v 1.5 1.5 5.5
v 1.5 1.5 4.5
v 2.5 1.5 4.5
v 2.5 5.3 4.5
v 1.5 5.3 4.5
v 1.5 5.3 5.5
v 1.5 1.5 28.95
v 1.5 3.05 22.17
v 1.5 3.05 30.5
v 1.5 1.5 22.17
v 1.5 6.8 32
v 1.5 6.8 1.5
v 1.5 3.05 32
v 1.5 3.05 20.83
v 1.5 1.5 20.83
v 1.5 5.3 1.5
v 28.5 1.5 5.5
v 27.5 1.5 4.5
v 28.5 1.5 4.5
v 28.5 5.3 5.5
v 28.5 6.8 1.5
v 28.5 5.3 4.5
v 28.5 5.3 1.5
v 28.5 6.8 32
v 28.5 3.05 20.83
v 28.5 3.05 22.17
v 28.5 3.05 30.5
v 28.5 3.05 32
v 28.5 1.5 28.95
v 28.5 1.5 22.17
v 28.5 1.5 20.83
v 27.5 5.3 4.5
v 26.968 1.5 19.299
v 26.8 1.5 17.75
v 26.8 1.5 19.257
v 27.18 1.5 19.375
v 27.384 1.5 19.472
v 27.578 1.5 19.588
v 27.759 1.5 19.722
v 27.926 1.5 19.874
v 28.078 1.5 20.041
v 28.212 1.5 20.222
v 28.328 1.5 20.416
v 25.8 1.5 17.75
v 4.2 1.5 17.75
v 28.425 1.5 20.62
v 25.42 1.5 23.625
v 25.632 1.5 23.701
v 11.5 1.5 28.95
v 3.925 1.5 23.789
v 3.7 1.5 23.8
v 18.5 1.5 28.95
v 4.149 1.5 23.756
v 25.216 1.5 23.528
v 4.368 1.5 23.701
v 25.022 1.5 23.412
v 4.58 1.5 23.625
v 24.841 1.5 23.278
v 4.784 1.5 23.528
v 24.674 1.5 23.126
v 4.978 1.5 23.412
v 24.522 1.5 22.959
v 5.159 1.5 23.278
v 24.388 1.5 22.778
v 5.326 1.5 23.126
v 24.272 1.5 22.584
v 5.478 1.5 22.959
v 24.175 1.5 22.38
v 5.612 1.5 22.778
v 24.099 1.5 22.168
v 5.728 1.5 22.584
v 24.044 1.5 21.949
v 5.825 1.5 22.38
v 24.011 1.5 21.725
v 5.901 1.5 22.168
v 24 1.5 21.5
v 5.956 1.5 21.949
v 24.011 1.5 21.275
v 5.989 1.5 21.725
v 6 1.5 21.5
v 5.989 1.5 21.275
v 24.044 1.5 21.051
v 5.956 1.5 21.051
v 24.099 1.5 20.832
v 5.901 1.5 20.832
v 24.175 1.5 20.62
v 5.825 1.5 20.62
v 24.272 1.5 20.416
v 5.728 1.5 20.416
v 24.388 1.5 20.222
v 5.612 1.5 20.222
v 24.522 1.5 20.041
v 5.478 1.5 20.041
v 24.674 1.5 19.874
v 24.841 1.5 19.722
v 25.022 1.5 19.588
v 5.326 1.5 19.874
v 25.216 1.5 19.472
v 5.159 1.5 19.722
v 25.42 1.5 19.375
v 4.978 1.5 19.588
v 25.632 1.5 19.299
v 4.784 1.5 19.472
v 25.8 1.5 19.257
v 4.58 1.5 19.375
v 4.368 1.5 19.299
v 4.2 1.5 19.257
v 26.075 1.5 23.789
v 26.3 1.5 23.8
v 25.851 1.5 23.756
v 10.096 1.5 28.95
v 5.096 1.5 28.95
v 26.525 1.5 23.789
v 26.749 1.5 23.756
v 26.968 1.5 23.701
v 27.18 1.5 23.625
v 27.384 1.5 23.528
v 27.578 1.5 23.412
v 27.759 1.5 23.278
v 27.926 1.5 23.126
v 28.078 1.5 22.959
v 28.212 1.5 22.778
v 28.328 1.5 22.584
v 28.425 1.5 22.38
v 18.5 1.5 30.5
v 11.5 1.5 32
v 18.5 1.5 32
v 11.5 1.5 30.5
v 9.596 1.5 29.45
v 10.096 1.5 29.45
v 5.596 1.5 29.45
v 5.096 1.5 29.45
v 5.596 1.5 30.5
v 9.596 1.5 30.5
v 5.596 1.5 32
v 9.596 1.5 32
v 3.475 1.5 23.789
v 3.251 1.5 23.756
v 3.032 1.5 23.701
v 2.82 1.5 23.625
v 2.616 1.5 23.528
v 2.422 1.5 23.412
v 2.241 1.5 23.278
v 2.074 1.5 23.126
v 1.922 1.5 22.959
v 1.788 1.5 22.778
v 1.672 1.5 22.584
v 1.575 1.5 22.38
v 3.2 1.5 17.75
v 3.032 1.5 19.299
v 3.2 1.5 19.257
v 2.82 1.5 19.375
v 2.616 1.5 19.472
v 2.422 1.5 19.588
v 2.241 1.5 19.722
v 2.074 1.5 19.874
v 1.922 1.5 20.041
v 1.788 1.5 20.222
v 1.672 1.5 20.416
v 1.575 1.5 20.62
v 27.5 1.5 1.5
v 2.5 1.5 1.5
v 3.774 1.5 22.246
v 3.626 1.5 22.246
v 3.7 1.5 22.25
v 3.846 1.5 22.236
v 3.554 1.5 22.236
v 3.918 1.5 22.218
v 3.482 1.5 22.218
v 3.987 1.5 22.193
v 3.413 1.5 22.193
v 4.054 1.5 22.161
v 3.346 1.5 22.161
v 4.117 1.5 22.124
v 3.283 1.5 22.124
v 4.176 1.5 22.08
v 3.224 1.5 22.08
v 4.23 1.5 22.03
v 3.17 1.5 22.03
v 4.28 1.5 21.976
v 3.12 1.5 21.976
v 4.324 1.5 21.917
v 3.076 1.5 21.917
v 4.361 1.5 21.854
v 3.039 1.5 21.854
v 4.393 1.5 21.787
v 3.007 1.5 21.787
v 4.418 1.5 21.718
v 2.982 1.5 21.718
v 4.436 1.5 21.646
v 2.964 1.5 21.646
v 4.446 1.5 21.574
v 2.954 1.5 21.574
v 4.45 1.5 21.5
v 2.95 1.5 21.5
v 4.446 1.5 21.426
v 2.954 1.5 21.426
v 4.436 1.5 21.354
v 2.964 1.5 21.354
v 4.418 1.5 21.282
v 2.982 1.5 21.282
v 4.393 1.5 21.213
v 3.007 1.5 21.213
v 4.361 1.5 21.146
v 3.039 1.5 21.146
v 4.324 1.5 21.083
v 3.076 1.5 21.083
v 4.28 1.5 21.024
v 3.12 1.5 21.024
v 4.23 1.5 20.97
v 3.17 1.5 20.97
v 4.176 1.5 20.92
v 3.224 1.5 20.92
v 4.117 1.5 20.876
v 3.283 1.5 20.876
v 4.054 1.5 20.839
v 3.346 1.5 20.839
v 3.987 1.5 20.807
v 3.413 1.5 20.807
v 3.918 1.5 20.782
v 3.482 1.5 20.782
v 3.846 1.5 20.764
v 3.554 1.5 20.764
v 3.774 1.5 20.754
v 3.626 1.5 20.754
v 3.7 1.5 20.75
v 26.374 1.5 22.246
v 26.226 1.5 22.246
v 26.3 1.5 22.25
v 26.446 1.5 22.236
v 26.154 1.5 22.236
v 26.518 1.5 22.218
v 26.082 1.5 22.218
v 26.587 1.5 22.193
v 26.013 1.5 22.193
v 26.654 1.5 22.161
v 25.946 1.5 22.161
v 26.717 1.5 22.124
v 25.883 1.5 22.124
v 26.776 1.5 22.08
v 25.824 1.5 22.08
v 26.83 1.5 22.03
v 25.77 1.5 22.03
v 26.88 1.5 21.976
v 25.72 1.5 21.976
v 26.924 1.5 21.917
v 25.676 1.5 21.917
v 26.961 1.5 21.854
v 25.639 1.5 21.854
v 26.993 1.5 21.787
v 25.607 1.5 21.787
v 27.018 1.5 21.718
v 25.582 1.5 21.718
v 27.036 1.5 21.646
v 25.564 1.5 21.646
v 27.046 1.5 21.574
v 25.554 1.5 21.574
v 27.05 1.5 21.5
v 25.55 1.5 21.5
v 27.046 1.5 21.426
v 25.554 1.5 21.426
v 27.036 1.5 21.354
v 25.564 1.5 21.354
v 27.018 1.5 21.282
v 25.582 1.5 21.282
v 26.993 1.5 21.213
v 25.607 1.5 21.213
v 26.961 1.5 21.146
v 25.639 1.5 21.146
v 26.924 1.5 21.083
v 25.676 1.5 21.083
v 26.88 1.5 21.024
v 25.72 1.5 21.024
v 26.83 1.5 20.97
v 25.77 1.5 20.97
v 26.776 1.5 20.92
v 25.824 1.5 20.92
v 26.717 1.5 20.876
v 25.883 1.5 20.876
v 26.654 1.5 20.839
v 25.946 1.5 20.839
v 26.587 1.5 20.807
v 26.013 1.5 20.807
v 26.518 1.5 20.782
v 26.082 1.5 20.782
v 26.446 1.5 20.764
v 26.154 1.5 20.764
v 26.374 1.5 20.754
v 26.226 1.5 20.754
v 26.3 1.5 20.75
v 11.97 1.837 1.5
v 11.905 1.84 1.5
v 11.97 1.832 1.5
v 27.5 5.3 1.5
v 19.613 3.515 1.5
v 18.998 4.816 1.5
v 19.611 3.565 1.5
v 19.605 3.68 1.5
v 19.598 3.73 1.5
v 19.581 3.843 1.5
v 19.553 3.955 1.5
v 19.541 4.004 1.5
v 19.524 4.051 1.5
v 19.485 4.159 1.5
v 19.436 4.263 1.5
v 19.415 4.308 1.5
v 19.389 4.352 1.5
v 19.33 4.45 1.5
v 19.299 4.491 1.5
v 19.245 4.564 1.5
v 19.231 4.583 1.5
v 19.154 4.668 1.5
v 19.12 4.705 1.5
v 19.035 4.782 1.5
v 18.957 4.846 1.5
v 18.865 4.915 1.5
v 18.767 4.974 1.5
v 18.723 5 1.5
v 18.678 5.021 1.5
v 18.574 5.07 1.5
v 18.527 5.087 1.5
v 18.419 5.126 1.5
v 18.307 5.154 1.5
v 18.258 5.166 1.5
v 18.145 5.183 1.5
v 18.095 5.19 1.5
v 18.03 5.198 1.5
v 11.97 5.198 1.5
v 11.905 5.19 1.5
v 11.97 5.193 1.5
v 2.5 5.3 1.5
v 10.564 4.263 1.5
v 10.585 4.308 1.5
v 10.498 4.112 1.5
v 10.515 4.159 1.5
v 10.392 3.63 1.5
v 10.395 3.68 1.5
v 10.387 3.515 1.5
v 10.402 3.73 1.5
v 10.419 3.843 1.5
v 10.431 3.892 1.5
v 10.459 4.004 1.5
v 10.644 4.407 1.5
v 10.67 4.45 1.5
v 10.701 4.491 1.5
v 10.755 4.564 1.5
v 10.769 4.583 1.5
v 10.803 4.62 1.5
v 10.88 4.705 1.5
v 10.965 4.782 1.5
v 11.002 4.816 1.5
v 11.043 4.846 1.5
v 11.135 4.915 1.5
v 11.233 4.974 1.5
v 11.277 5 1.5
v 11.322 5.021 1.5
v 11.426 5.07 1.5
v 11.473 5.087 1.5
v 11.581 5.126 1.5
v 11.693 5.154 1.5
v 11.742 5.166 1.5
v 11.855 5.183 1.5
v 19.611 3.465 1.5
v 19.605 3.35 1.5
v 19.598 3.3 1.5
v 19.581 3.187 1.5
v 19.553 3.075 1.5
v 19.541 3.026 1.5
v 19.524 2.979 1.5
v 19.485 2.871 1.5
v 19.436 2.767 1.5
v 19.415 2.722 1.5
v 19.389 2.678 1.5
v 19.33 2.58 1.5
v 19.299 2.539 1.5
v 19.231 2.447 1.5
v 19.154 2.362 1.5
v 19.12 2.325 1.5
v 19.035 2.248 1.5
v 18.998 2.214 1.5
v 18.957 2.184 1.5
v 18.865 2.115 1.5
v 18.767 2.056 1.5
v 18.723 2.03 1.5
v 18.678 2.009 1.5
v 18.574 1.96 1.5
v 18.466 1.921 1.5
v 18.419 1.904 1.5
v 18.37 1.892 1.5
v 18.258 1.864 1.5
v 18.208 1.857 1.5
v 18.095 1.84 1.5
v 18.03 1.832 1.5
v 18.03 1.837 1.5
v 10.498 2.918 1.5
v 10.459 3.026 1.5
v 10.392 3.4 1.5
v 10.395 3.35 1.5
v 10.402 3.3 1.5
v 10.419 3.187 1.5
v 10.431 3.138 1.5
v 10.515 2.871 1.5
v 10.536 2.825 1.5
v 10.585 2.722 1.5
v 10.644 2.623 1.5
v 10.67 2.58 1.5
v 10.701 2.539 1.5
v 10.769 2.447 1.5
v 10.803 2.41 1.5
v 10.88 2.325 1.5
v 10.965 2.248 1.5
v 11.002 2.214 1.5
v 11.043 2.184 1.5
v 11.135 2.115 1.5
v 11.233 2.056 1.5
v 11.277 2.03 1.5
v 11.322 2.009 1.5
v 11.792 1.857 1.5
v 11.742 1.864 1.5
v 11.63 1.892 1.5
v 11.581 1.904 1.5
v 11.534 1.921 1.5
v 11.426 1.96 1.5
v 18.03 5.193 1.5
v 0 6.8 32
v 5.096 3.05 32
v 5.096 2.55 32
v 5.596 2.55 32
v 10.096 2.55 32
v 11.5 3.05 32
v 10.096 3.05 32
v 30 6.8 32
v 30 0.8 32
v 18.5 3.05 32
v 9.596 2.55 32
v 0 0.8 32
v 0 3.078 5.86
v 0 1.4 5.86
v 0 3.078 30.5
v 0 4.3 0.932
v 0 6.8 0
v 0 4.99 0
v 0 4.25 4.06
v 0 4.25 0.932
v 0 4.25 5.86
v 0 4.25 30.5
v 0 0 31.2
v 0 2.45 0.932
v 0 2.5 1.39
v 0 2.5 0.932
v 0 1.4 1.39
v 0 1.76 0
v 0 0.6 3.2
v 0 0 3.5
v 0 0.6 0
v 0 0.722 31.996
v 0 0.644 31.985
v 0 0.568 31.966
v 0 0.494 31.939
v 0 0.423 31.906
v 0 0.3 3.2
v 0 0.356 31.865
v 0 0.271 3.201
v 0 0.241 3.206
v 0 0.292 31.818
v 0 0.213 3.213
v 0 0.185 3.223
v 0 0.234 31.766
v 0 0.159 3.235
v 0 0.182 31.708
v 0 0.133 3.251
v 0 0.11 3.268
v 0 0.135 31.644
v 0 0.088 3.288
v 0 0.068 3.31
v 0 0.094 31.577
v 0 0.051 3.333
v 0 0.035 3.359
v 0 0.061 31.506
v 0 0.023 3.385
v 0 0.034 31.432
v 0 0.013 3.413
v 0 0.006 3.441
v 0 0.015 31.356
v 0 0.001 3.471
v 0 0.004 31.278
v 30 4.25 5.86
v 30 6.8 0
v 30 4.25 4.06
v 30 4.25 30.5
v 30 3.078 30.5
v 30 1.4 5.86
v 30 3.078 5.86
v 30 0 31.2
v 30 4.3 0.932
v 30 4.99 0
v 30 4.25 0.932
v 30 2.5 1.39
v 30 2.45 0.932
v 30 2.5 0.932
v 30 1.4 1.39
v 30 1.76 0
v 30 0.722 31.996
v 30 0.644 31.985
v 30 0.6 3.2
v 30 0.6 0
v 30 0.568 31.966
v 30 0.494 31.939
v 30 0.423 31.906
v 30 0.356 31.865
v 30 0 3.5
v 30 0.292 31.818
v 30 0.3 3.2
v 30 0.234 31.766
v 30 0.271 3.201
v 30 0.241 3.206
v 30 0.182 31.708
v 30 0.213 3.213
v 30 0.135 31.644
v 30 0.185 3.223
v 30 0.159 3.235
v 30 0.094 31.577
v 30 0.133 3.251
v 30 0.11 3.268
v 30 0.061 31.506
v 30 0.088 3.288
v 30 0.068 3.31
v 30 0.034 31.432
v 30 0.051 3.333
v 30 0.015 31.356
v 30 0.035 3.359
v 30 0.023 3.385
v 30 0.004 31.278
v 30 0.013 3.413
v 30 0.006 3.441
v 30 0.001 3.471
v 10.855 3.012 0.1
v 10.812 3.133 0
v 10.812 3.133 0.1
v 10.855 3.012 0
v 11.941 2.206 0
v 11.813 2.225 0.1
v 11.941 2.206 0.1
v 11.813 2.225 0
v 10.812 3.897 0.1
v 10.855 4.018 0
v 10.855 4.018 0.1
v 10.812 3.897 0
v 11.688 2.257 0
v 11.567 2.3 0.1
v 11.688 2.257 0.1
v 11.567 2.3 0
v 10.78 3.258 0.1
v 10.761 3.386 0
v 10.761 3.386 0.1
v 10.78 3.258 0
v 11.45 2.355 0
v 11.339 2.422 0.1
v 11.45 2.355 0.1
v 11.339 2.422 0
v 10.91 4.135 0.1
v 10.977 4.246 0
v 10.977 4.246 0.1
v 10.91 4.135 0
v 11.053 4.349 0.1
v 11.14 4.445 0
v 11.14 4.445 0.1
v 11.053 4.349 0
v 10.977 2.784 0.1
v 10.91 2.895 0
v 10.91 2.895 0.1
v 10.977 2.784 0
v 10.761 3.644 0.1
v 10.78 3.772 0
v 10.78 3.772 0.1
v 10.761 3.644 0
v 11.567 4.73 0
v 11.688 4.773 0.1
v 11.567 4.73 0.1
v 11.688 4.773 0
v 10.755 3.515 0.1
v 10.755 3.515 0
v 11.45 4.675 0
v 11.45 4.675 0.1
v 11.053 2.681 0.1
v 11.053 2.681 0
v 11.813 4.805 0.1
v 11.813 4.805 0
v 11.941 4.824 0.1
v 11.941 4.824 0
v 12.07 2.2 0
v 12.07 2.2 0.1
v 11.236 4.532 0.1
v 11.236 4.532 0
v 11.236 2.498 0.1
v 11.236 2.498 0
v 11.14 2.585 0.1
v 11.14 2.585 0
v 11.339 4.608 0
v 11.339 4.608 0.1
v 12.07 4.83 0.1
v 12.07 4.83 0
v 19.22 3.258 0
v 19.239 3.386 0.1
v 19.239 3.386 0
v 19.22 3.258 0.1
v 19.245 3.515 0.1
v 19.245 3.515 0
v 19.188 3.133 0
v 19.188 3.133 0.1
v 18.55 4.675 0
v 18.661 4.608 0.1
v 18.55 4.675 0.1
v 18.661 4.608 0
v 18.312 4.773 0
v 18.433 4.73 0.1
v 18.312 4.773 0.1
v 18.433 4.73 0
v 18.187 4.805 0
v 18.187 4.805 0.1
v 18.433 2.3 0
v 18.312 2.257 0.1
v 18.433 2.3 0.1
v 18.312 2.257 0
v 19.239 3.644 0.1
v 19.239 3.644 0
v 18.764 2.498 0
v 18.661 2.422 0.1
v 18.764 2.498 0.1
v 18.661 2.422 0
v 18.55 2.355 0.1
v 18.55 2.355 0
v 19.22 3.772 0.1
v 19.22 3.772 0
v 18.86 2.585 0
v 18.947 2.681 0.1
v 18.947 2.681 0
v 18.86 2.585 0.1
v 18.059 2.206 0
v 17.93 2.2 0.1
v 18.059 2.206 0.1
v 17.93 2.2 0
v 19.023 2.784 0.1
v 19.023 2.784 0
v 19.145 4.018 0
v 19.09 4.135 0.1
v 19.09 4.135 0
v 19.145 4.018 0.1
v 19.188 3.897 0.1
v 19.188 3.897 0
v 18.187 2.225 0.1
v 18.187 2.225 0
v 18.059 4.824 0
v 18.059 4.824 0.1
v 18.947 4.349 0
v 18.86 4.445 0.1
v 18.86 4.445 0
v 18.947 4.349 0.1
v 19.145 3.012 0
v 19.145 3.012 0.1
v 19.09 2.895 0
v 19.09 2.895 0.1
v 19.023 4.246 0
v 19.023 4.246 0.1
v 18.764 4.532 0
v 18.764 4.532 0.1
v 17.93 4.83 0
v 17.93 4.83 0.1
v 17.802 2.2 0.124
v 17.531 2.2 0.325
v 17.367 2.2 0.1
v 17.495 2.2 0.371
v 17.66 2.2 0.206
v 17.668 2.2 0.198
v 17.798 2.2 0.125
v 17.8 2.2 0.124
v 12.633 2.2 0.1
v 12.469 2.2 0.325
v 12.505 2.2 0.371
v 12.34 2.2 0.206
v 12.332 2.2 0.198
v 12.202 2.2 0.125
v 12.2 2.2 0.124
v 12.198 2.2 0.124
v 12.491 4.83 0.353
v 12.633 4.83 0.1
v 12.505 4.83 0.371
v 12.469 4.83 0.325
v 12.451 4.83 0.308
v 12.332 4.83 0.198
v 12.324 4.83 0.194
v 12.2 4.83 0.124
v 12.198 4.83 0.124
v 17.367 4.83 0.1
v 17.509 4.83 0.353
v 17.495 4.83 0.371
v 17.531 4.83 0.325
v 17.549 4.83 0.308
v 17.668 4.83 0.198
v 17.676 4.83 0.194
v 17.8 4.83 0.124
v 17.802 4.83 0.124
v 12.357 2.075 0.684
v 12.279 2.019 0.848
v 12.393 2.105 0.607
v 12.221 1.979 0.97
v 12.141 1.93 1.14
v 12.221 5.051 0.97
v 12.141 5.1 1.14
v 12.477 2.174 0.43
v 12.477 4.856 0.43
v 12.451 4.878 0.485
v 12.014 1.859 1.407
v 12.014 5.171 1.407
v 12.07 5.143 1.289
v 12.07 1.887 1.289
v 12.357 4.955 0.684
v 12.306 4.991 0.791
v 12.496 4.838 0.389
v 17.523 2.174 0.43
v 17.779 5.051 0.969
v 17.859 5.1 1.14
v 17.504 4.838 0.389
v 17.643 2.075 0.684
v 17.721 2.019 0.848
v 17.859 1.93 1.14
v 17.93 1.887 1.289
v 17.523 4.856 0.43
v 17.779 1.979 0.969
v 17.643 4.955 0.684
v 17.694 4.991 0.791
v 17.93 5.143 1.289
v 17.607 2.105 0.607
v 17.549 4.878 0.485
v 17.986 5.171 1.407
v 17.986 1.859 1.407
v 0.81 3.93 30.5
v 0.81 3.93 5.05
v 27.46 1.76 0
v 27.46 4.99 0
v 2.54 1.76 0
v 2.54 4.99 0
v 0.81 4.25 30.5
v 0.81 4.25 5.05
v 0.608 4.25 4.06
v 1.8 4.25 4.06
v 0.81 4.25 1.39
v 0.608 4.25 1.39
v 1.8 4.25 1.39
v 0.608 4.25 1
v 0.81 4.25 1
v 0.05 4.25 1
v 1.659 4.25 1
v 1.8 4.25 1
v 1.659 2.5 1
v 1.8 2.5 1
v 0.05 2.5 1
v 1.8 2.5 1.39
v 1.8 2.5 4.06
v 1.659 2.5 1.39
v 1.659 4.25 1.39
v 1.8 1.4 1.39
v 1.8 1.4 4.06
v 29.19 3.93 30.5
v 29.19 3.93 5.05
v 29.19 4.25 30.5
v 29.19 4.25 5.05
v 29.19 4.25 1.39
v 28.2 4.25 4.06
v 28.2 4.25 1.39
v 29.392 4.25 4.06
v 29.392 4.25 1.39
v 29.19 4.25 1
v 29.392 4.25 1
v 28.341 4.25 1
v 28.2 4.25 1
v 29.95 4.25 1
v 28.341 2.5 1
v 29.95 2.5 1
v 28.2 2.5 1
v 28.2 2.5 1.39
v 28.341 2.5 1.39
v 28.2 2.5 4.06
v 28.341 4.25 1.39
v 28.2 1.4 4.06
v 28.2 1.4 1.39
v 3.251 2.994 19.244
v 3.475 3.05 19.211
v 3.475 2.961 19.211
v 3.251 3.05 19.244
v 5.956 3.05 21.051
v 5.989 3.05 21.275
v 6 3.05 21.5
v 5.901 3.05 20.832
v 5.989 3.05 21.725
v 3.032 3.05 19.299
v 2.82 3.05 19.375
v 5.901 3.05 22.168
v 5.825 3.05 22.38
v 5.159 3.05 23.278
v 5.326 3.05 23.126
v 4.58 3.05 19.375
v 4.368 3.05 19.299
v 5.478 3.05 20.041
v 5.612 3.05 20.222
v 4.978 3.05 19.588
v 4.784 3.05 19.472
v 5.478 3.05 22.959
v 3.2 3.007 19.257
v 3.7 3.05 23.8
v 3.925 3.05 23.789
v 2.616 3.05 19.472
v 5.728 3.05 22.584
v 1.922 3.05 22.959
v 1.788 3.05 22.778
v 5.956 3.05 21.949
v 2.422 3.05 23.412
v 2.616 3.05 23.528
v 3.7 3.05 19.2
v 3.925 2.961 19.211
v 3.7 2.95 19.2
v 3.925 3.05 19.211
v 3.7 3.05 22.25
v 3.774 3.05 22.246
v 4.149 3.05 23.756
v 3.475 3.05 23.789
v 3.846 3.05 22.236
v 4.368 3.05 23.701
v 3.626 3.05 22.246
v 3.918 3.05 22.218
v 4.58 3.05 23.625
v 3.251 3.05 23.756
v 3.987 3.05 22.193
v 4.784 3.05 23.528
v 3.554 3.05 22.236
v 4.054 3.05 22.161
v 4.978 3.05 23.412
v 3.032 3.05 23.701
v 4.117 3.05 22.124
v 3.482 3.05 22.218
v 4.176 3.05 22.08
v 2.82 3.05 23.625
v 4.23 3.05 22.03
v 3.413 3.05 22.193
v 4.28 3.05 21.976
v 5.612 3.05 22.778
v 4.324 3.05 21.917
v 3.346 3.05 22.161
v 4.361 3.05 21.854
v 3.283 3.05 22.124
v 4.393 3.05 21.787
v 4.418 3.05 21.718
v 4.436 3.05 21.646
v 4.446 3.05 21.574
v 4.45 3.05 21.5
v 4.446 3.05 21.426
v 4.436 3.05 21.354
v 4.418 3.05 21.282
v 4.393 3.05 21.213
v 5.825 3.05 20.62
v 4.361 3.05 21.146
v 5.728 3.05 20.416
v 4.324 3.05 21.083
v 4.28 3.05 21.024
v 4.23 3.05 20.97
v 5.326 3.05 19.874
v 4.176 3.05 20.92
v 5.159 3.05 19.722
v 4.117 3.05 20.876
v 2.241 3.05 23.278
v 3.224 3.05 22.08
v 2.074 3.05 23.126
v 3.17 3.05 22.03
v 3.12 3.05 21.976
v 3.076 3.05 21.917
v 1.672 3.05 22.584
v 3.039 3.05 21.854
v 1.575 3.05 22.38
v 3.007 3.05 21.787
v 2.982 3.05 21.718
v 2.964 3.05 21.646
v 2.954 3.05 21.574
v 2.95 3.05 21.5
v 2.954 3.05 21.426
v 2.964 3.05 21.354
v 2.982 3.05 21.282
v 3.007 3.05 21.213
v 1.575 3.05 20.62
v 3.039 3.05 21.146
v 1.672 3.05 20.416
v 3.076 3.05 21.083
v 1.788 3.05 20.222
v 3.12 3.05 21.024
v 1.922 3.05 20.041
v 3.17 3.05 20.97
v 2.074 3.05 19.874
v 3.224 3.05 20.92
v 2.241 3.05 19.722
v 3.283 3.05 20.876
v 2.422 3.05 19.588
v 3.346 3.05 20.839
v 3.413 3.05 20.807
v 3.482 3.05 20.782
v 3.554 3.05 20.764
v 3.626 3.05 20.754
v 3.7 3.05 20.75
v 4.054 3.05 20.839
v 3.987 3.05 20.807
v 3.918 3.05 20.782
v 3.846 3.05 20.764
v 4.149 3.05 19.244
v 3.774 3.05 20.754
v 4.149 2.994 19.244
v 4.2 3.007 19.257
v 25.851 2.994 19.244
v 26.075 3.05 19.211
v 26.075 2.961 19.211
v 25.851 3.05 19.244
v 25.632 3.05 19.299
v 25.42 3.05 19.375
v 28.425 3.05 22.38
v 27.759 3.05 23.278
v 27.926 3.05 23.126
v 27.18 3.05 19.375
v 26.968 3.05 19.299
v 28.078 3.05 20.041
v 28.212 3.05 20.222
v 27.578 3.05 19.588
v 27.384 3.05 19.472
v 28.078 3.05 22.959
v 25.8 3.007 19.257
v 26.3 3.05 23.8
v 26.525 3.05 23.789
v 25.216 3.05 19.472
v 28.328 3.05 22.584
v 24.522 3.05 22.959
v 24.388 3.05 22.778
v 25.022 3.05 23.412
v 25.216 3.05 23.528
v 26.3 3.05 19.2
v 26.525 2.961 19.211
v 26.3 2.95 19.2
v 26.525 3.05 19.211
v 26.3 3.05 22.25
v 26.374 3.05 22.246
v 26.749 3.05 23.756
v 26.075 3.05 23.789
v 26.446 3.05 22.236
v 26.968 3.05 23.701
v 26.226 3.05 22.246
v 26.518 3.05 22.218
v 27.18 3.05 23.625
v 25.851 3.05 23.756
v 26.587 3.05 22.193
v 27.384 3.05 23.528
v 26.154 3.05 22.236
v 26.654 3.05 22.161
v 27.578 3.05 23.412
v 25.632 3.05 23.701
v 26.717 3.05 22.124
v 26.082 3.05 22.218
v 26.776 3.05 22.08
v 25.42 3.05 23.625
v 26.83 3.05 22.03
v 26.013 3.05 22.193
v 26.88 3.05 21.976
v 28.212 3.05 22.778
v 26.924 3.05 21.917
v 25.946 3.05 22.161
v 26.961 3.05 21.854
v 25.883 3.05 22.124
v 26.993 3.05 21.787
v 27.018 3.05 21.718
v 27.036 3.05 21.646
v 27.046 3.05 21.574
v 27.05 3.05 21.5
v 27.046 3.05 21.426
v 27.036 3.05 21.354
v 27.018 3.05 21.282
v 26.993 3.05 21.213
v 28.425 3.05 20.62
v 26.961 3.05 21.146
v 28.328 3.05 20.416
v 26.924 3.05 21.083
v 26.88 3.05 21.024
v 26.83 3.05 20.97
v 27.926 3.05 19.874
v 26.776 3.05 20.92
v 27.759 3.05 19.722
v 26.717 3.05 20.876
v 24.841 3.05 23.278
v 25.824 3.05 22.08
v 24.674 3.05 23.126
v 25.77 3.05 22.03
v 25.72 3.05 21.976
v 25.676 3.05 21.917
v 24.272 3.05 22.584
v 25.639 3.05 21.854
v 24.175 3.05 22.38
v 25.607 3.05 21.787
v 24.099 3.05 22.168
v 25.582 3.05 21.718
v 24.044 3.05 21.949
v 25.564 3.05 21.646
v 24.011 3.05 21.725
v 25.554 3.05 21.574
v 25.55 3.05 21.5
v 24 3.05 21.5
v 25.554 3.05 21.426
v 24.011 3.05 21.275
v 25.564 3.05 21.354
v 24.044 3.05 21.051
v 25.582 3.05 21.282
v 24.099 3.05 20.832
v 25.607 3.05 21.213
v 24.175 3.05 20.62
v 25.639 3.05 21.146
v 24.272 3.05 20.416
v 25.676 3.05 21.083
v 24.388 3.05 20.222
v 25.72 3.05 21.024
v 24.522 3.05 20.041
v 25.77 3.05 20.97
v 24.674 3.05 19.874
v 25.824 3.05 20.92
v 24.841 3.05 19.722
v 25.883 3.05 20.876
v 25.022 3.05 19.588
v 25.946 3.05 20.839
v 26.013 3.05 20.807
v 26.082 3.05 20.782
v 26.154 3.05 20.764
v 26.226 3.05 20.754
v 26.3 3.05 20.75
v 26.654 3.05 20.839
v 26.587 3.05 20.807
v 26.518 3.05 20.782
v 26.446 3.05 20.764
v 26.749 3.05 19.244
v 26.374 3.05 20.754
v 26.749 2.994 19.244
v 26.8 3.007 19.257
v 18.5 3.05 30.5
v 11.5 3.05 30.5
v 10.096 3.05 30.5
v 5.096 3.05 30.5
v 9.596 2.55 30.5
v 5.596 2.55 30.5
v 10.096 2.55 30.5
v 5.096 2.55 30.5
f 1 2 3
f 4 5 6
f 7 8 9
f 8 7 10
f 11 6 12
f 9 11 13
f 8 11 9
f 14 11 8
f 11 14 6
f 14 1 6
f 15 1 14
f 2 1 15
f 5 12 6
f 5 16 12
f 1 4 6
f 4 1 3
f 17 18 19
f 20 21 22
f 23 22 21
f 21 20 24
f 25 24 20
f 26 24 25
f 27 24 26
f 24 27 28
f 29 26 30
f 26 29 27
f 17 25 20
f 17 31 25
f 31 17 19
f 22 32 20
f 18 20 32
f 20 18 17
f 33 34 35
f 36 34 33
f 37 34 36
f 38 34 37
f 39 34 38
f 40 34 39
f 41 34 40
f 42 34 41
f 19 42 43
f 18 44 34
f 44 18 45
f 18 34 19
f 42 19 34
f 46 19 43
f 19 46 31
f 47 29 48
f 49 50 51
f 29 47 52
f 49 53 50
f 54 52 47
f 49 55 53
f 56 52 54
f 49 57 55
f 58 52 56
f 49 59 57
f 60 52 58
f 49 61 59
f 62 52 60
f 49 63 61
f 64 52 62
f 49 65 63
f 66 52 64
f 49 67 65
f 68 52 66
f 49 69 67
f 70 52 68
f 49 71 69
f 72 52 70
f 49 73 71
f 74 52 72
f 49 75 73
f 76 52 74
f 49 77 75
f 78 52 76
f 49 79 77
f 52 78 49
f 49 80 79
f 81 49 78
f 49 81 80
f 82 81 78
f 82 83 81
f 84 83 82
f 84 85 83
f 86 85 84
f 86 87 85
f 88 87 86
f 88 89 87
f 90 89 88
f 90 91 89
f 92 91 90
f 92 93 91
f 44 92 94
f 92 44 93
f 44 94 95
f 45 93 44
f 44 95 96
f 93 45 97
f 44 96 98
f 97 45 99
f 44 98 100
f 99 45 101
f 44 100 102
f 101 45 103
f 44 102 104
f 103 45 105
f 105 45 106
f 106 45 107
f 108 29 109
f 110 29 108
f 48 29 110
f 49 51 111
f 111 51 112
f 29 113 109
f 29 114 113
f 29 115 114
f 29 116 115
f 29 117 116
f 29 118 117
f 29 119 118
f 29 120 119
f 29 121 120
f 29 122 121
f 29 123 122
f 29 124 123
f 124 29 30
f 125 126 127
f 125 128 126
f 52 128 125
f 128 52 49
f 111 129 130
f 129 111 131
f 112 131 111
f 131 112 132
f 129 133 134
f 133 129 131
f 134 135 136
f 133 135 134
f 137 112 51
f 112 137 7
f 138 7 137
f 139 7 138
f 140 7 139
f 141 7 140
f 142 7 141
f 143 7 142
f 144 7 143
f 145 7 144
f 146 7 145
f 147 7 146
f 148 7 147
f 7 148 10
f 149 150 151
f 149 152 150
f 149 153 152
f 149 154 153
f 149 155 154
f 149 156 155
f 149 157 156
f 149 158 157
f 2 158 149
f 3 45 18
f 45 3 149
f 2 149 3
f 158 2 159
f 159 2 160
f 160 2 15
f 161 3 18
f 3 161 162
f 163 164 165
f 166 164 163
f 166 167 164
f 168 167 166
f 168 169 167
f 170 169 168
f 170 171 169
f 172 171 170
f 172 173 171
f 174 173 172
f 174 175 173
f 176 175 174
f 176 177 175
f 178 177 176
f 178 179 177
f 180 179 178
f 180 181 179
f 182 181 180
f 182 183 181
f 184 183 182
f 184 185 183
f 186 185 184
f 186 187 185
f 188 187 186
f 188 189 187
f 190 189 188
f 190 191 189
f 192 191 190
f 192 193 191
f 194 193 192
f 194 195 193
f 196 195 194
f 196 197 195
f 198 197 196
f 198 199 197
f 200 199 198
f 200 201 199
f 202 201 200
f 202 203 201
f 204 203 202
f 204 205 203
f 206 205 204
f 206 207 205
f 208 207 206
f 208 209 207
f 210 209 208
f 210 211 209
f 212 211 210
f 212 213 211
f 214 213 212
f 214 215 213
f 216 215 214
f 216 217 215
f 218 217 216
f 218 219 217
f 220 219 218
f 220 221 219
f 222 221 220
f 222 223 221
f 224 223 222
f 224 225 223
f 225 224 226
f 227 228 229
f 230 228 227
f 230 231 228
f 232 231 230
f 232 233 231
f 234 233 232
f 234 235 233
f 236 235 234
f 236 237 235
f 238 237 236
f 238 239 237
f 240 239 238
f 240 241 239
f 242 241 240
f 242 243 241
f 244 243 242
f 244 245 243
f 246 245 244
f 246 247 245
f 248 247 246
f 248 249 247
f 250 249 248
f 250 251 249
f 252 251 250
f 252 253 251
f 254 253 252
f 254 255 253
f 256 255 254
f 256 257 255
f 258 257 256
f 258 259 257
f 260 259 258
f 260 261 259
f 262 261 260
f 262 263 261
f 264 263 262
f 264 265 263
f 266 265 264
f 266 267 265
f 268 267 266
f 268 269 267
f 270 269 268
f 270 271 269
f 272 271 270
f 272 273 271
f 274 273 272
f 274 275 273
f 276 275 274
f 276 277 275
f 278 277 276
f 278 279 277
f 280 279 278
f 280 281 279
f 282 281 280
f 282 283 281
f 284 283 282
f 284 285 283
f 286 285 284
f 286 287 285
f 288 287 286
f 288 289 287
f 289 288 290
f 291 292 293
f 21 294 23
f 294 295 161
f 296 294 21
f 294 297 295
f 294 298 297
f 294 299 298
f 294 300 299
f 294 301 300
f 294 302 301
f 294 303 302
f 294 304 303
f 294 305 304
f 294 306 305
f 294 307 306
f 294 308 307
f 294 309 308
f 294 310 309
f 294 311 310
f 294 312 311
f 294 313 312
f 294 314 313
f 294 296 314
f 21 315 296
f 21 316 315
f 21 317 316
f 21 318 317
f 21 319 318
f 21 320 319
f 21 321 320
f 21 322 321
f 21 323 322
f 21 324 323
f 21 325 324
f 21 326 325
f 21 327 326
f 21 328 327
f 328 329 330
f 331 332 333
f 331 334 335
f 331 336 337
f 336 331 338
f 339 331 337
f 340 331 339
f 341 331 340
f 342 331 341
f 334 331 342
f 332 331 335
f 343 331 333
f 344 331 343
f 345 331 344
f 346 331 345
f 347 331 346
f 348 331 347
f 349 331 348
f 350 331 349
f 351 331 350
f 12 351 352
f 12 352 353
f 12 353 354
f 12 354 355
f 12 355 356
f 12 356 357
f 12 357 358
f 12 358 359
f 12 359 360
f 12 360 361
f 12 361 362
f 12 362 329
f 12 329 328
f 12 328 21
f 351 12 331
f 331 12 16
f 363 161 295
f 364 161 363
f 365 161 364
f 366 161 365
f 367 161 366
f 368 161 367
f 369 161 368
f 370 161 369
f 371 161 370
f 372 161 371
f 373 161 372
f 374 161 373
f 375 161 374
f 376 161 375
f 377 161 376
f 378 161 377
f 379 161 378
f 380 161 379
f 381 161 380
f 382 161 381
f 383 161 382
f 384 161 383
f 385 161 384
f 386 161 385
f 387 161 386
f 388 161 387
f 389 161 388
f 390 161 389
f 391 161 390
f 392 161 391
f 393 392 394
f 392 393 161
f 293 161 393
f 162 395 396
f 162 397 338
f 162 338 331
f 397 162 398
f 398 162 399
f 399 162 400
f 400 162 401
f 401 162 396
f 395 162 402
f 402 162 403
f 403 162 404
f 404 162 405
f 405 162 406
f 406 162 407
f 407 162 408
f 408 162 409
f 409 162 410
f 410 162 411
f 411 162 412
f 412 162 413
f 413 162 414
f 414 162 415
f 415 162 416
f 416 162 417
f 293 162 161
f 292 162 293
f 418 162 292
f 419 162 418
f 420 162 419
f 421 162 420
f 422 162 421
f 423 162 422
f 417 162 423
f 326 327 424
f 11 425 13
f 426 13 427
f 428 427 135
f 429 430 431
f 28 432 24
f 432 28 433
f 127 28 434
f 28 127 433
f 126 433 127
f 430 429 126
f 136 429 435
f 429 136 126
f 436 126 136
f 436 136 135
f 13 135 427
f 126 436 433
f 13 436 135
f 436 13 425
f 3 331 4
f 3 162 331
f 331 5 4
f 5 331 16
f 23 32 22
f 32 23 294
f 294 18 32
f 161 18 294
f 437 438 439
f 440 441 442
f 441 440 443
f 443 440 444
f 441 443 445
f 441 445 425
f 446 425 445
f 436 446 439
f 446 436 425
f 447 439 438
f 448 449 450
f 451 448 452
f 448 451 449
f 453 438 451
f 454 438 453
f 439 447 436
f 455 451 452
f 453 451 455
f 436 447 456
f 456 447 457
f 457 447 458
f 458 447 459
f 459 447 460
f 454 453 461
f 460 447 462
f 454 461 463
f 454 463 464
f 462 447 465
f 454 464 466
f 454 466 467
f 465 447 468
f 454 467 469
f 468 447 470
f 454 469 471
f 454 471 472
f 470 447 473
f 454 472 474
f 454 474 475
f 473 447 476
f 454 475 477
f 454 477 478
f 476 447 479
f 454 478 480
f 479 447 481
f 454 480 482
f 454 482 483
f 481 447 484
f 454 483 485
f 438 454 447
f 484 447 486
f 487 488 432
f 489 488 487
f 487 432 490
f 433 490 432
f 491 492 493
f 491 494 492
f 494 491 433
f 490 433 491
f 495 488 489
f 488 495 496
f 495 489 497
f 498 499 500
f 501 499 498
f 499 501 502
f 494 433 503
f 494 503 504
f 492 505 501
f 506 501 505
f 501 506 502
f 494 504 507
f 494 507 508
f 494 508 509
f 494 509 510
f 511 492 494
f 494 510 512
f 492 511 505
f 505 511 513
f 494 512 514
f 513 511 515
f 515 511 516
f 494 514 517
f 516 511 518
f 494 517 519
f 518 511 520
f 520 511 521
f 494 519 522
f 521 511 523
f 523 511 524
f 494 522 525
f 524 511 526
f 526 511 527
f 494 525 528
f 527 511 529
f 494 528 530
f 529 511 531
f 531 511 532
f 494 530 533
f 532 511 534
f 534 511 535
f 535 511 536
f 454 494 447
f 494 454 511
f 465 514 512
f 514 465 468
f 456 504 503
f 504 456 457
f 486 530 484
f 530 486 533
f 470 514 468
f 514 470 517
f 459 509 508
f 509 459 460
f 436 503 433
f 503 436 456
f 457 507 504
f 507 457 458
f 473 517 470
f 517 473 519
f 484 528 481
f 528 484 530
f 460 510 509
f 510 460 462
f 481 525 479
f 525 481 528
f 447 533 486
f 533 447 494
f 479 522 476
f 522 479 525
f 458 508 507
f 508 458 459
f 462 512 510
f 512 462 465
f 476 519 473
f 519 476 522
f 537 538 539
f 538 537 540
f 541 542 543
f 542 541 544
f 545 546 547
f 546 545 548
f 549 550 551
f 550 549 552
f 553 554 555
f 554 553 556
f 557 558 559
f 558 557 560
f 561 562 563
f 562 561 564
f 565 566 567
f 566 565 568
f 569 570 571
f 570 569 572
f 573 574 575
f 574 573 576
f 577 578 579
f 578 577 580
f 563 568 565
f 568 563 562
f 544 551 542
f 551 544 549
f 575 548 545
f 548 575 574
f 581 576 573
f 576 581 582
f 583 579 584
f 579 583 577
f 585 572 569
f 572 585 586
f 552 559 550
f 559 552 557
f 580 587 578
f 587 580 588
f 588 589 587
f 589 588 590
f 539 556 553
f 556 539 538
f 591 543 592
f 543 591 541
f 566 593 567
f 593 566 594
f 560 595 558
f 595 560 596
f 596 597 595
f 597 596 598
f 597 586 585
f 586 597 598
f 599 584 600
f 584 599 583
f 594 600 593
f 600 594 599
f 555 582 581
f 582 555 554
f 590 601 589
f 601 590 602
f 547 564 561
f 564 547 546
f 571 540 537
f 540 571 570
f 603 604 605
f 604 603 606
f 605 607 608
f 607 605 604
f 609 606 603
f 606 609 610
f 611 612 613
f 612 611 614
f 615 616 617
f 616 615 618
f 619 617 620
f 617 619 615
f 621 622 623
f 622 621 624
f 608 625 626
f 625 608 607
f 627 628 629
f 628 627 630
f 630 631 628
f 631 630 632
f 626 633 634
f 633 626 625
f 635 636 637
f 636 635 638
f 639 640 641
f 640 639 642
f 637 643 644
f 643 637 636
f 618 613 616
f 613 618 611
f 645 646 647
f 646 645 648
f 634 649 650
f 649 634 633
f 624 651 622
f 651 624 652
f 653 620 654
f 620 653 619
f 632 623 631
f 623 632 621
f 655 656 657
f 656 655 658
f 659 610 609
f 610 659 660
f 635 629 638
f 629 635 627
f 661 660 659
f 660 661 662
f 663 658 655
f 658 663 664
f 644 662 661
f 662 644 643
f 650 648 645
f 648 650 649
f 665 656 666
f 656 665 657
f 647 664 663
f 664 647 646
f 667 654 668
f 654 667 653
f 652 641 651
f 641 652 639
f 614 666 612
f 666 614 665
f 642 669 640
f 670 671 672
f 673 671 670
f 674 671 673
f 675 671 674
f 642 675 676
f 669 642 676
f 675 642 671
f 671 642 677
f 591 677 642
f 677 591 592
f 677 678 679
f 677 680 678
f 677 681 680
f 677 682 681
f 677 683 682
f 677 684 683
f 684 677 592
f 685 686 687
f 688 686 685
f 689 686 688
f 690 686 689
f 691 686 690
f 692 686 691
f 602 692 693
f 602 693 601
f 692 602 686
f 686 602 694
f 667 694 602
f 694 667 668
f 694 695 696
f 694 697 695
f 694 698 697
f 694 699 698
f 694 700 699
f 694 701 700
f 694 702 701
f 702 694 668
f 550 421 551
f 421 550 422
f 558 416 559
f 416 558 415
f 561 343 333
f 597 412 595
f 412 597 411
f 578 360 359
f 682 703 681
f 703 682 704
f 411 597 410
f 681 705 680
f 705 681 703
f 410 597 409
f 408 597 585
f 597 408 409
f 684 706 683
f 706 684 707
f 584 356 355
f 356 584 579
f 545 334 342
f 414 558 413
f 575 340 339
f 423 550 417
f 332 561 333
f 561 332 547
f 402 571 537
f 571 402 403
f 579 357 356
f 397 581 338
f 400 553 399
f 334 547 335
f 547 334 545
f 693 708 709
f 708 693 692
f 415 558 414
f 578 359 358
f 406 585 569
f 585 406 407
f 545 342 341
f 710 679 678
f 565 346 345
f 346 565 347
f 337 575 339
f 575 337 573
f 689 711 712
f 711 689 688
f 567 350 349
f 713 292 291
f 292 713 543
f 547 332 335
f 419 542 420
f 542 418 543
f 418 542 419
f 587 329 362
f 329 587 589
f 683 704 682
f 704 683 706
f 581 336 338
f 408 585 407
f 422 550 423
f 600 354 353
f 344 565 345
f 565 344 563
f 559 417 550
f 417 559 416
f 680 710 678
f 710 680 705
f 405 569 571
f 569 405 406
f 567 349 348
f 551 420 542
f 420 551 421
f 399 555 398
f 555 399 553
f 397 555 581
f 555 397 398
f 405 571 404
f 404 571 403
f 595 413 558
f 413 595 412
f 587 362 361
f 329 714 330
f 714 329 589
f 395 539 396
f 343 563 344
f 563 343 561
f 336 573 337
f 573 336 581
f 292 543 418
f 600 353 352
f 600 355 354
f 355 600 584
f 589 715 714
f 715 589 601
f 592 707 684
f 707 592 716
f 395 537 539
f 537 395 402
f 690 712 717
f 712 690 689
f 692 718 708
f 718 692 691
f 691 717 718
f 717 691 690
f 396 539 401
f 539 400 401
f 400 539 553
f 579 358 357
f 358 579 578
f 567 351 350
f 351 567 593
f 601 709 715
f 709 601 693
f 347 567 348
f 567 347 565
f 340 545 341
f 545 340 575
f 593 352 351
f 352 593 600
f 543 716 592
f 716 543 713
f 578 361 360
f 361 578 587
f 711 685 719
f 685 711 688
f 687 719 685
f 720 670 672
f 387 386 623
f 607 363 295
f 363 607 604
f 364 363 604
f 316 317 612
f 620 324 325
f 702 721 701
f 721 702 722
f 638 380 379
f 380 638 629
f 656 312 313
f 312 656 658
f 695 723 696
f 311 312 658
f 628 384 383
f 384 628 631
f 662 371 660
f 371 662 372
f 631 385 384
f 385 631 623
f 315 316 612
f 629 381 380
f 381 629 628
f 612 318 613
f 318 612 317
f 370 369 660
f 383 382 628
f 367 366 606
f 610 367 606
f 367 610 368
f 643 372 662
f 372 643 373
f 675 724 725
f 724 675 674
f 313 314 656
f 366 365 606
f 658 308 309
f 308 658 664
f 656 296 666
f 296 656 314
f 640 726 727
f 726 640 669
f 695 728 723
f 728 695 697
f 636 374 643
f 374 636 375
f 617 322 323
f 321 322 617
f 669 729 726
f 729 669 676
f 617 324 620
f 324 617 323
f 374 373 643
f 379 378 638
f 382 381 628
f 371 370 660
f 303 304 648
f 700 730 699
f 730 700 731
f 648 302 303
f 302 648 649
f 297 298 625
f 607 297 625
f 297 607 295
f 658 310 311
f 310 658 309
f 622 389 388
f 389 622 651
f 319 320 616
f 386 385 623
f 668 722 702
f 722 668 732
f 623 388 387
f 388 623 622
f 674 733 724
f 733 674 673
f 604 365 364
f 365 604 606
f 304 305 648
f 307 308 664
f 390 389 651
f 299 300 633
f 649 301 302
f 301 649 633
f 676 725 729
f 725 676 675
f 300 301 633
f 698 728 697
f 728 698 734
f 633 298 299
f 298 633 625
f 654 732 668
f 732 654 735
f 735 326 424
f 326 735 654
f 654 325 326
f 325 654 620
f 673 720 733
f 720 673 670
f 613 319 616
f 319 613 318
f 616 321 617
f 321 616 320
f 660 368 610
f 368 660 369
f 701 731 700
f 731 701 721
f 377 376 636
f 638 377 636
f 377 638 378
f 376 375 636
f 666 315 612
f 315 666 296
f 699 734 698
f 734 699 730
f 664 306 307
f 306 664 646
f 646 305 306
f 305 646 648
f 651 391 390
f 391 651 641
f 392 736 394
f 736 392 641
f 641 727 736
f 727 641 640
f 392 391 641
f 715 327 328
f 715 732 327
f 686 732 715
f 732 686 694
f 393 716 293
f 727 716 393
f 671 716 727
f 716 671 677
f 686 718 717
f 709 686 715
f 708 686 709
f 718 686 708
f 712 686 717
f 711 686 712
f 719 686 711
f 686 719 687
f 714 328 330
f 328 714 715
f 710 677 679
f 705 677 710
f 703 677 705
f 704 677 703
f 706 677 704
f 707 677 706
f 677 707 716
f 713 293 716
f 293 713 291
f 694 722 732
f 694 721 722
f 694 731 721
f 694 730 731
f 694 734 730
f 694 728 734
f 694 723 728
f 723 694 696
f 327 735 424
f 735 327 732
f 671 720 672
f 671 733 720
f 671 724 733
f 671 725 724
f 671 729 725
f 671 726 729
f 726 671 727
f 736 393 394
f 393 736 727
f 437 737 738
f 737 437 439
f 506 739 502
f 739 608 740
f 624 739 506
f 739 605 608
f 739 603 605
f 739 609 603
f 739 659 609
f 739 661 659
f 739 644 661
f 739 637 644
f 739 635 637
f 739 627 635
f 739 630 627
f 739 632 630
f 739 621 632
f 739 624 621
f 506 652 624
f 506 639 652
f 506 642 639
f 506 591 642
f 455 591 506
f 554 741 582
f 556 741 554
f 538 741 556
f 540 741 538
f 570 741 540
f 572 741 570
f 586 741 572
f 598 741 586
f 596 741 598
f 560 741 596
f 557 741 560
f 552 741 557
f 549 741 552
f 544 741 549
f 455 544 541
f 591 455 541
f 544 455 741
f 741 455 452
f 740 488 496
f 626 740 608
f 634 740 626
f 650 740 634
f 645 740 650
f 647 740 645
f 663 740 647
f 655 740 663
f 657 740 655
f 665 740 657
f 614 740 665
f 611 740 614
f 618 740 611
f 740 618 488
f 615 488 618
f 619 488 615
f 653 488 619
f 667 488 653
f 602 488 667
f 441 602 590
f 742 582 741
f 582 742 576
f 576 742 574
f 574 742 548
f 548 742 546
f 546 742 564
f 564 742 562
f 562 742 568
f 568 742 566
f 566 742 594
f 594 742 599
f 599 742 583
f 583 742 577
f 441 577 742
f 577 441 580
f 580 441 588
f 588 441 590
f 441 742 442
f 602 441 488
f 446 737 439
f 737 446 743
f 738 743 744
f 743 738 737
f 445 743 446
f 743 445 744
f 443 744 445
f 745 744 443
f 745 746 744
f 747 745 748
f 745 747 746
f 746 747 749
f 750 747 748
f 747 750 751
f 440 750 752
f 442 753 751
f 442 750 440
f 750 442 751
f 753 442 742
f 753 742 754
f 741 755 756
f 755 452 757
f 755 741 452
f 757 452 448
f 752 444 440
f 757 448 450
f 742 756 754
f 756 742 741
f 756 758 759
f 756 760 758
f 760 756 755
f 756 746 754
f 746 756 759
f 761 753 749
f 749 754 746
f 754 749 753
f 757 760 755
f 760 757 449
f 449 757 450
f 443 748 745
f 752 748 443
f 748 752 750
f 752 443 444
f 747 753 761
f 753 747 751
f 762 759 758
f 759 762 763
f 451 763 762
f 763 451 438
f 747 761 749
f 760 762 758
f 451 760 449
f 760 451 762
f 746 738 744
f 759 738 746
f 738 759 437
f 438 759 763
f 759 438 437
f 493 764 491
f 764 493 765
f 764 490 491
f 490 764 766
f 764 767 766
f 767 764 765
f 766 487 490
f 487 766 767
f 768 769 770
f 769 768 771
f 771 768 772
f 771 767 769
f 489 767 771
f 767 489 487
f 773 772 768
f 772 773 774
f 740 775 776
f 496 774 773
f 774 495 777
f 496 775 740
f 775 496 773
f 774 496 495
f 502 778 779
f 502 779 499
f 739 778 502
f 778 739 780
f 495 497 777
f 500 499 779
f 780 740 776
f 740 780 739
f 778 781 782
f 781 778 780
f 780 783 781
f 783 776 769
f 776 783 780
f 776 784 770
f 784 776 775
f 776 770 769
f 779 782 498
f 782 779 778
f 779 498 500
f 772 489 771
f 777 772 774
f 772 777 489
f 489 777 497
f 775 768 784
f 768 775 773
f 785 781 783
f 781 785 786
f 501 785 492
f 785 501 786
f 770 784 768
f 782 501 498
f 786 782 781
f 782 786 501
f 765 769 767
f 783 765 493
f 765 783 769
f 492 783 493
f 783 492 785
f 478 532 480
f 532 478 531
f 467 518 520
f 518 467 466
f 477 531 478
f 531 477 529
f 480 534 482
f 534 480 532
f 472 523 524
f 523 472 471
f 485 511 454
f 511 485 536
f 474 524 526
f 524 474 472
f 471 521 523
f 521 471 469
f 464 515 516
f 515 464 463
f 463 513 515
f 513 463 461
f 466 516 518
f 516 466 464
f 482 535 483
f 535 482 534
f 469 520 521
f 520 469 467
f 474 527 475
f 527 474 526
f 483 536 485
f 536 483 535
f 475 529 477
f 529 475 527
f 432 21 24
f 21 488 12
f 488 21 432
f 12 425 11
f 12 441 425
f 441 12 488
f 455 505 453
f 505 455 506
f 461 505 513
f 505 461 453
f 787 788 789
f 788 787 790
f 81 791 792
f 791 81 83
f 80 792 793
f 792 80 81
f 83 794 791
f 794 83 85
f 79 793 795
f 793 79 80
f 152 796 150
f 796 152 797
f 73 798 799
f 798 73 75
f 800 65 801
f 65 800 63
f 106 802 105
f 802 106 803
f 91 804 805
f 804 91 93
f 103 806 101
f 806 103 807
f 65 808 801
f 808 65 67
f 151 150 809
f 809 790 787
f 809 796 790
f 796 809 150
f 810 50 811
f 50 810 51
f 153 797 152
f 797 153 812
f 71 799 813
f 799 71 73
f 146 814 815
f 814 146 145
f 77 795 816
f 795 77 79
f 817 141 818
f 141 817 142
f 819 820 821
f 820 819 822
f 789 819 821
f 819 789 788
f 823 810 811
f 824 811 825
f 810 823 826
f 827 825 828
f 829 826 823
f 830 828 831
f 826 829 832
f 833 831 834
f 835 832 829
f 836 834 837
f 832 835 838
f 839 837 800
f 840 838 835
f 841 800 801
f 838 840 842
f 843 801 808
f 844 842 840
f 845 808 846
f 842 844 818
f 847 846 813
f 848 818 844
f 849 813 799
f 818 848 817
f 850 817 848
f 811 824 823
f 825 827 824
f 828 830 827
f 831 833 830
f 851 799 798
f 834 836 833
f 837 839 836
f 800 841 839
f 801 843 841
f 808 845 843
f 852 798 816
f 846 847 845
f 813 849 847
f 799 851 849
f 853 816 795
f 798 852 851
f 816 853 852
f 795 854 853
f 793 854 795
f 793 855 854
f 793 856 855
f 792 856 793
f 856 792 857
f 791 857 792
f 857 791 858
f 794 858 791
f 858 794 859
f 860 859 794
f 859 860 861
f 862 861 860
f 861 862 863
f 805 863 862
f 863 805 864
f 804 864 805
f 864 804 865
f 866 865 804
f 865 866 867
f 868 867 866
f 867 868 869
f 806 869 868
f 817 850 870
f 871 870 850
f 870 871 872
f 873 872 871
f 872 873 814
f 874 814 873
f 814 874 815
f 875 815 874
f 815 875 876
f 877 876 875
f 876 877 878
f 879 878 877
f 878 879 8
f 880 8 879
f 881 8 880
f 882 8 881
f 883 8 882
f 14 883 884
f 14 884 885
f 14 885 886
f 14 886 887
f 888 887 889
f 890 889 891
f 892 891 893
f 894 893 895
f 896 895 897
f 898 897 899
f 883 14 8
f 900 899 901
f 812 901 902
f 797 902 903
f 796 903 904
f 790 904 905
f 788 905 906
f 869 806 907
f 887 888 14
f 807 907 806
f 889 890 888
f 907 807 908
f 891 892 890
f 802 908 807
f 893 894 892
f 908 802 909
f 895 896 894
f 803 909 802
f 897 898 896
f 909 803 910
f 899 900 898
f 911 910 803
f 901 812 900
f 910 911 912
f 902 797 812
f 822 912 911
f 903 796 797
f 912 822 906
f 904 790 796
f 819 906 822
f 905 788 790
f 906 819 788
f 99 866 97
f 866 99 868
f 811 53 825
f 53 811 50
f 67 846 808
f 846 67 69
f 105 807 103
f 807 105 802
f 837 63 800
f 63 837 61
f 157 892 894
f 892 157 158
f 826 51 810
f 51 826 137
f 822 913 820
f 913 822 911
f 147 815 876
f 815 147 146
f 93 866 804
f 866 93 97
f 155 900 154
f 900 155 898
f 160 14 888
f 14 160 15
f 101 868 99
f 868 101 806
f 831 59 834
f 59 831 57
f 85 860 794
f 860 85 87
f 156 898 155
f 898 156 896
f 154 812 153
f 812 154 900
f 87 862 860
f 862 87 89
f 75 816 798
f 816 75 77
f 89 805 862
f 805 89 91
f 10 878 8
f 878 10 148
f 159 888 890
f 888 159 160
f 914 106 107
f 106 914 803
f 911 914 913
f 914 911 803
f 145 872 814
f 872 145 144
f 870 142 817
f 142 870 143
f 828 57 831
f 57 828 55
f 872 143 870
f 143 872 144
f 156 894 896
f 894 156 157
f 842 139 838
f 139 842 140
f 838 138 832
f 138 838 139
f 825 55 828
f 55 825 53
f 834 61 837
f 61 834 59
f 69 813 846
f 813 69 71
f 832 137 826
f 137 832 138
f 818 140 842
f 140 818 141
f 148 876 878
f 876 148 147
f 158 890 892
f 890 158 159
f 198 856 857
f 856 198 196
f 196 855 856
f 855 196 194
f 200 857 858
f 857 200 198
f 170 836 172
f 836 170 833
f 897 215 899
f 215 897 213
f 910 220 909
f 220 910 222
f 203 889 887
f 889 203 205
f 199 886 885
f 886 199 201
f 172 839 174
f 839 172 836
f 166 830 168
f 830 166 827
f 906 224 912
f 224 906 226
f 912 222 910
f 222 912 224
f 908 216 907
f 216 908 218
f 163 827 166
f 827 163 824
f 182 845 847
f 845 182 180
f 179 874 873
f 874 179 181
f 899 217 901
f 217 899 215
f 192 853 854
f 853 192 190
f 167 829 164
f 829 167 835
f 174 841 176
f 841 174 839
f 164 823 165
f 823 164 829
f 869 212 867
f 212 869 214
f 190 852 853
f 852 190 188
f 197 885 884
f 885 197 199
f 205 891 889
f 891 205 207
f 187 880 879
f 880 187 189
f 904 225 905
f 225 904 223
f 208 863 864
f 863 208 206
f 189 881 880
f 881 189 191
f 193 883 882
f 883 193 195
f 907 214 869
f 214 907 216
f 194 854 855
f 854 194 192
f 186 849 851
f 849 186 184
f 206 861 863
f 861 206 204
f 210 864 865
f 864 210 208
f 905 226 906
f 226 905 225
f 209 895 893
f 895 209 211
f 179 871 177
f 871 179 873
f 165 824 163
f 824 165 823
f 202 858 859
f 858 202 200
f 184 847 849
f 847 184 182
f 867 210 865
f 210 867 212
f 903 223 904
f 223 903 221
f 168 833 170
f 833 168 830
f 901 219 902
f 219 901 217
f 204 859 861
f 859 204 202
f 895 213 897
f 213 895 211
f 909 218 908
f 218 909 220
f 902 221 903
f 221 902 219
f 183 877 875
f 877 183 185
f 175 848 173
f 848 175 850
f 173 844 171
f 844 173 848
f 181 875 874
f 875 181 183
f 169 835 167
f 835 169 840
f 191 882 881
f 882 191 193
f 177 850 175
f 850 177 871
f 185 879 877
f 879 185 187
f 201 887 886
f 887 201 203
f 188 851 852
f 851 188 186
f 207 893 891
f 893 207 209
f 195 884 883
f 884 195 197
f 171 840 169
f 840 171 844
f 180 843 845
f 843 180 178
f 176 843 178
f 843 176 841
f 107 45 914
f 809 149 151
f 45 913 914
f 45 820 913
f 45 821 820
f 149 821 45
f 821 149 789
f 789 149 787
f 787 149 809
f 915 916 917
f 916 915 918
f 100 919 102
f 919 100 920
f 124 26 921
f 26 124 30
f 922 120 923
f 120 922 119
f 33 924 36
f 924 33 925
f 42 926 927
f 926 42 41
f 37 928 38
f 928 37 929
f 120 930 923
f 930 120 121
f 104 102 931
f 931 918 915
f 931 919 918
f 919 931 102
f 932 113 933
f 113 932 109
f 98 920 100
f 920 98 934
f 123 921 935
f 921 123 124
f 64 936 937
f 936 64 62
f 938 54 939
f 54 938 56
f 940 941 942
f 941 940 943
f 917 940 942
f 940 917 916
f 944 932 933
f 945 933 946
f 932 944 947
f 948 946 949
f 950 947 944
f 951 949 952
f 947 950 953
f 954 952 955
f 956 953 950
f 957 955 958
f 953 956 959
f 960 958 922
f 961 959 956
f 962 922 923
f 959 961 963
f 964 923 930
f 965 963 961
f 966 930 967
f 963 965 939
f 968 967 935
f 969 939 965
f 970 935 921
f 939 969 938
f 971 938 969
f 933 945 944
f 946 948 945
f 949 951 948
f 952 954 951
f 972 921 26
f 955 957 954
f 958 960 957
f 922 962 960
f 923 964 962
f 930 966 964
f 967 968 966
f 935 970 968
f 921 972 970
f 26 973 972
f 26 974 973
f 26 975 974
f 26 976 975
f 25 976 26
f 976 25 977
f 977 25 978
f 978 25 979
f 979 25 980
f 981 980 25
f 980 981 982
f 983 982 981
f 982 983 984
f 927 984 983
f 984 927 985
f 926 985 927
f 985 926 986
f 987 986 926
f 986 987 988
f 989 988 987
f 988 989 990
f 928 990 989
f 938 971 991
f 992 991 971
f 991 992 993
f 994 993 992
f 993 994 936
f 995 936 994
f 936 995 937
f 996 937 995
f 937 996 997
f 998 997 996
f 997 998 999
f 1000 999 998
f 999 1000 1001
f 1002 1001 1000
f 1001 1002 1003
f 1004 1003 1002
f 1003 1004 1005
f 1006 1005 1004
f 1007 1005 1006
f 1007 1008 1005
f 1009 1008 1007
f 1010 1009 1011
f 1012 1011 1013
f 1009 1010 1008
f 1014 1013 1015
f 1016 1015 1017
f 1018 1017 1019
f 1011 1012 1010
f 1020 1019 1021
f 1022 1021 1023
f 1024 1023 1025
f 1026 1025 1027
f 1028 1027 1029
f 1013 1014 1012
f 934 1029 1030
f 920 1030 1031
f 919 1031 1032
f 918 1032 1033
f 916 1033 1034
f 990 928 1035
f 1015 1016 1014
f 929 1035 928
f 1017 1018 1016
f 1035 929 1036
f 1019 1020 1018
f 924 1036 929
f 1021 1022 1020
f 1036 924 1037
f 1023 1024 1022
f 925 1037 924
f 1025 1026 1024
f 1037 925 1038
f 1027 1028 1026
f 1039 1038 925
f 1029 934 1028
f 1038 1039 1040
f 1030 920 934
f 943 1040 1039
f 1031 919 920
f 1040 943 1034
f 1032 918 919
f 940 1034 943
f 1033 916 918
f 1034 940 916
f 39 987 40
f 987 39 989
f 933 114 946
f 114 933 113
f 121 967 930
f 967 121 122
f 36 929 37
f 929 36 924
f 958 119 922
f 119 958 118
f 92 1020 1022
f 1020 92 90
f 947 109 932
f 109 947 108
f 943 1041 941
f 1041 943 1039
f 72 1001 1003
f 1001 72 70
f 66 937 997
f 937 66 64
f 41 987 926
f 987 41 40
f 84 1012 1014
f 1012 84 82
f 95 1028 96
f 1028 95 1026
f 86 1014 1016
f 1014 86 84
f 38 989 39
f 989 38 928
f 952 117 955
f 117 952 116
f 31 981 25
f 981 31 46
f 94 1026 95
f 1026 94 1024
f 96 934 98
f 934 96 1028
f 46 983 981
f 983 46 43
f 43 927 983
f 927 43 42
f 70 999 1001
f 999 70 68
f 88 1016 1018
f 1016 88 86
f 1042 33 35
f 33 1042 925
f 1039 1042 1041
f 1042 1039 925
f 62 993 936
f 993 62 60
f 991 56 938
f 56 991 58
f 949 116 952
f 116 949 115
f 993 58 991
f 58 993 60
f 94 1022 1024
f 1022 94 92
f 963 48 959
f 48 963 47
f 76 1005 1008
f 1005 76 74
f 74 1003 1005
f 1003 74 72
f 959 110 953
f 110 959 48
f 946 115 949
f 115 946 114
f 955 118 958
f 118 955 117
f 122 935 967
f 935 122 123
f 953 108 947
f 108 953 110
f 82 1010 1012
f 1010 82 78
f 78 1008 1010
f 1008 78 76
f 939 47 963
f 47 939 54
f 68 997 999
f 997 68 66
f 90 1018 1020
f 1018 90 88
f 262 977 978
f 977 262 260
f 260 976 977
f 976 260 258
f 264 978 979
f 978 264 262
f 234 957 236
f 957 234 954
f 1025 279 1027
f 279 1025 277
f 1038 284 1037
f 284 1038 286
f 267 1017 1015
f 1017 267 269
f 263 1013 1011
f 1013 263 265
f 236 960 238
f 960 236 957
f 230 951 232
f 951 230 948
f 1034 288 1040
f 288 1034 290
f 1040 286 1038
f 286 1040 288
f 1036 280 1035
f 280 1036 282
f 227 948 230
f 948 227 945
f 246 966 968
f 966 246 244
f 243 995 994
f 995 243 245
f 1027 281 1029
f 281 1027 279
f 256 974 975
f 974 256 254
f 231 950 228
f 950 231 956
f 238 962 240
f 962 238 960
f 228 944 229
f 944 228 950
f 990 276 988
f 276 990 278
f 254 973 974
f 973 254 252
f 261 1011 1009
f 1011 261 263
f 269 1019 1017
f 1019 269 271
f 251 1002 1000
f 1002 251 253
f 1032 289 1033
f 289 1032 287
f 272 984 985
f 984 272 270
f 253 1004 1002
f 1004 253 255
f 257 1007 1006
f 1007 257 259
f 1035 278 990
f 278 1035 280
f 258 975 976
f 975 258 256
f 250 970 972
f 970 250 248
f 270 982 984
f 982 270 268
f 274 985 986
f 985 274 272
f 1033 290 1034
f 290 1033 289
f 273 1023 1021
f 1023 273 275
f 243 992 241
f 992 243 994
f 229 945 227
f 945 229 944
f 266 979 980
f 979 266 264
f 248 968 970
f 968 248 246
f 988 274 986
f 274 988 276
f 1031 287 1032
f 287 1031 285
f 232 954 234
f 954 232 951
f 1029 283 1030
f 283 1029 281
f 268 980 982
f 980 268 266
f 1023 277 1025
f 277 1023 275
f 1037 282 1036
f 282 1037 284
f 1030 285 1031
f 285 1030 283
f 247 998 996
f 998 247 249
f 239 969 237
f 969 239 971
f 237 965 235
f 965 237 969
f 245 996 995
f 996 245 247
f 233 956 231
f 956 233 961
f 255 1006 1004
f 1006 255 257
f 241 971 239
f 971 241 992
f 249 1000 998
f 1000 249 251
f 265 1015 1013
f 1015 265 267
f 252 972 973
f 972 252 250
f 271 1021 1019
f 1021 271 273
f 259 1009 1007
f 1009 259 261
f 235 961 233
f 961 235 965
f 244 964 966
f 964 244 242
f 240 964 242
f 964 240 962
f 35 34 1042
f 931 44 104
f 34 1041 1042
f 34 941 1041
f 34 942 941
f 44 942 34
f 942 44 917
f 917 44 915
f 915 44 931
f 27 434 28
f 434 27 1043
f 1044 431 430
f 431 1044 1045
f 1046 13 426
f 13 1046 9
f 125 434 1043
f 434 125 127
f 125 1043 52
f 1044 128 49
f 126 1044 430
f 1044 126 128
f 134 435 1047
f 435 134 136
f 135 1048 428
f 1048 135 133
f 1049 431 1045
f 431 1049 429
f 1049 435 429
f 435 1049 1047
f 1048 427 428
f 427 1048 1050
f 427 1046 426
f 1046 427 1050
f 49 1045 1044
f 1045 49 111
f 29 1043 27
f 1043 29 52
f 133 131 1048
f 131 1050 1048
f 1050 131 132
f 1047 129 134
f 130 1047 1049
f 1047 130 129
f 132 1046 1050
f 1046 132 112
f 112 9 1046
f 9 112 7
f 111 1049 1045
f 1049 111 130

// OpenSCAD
// Microcontroller Housing
//  An enclosure to use with the Microcontroller Expansion Card
//  reference design.
//
//  See https://frame.work for more information about Framework products and
//  additional documentation around Expansion Cards.

// Microcontroller Housing © 2021 by Nirav Patel at Framework Computer Inc
// is licensed under Attribution 4.0 International. 
// To view a copy of this license, visit http://creativecommons.org/licenses/by/4.0/

include <ExpansionCard.scad>;

gap = 0.5;
jst_w = 6.0; // JST SH 4-pin receptacle
jst_d = 4.25;
b3u_offset = 5.596+side_wall+pcb_gap;
b3u_w = 3.0; // Omron B3U-3100 button
b3u_pad_w = 4.0;
b3u_h = 1.2;
b3u_d = 2.5;
rib_w = 1;

module microcontroller_housing(make_printable = true) {
    difference() {
        expansion_card_base(open_end = false, make_printable = make_printable, pcb_mount="boss");
        translate([side_wall, 0, pcb_h]) cube([base[0]-side_wall*2, side_wall, base[2]]);
        // Cut out for bottom mount JST SH connector
        translate([base[0]/2-jst_w/2-gap, 0, 0]) cube([jst_w+gap*2, jst_d+gap, base[2]]);
        // Cut out for bottom mount reset switch
        translate([b3u_offset-b3u_w/2-gap, 0, pcb_h-b3u_h-gap]) cube([b3u_w+gap*2, b3u_d+gap, base[2]]);
        translate([b3u_offset-b3u_pad_w/2-gap, 0, pcb_h-gap]) cube([b3u_pad_w+gap*2, b3u_d+gap, base[2]]);
    }

    if (make_printable) {
        // Add ribs for printability
        translate([base[0]/2-jst_w/2-gap-rib_w/2, side_wall, 0]) rib(rib_w, pcb_h);
        translate([base[0]*0.75+jst_w*0.25+gap/2, side_wall, 0]) rib(base[0]/2-jst_w/2-gap, pcb_h);
        translate([b3u_offset-b3u_w/2-gap-rib_w/2, side_wall, 0]) rib(rib_w, pcb_h-gap);
        translate([b3u_offset+b3u_w/2+gap+rib_w/2, side_wall, 0]) rib(rib_w, pcb_h-gap);
        translate([b3u_offset/2-b3u_pad_w/4-gap/2, side_wall, 0]) rib(b3u_offset-b3u_pad_w/2-gap, pcb_h);
        translate([b3u_offset+b3u_pad_w/2+gap+rib_w/2, side_wall, 0]) rib(rib_w, pcb_h);
    }
}

rotate([-90, 0, 0]) translate([0, -base[1], 0]) microcontroller_housing(true);
